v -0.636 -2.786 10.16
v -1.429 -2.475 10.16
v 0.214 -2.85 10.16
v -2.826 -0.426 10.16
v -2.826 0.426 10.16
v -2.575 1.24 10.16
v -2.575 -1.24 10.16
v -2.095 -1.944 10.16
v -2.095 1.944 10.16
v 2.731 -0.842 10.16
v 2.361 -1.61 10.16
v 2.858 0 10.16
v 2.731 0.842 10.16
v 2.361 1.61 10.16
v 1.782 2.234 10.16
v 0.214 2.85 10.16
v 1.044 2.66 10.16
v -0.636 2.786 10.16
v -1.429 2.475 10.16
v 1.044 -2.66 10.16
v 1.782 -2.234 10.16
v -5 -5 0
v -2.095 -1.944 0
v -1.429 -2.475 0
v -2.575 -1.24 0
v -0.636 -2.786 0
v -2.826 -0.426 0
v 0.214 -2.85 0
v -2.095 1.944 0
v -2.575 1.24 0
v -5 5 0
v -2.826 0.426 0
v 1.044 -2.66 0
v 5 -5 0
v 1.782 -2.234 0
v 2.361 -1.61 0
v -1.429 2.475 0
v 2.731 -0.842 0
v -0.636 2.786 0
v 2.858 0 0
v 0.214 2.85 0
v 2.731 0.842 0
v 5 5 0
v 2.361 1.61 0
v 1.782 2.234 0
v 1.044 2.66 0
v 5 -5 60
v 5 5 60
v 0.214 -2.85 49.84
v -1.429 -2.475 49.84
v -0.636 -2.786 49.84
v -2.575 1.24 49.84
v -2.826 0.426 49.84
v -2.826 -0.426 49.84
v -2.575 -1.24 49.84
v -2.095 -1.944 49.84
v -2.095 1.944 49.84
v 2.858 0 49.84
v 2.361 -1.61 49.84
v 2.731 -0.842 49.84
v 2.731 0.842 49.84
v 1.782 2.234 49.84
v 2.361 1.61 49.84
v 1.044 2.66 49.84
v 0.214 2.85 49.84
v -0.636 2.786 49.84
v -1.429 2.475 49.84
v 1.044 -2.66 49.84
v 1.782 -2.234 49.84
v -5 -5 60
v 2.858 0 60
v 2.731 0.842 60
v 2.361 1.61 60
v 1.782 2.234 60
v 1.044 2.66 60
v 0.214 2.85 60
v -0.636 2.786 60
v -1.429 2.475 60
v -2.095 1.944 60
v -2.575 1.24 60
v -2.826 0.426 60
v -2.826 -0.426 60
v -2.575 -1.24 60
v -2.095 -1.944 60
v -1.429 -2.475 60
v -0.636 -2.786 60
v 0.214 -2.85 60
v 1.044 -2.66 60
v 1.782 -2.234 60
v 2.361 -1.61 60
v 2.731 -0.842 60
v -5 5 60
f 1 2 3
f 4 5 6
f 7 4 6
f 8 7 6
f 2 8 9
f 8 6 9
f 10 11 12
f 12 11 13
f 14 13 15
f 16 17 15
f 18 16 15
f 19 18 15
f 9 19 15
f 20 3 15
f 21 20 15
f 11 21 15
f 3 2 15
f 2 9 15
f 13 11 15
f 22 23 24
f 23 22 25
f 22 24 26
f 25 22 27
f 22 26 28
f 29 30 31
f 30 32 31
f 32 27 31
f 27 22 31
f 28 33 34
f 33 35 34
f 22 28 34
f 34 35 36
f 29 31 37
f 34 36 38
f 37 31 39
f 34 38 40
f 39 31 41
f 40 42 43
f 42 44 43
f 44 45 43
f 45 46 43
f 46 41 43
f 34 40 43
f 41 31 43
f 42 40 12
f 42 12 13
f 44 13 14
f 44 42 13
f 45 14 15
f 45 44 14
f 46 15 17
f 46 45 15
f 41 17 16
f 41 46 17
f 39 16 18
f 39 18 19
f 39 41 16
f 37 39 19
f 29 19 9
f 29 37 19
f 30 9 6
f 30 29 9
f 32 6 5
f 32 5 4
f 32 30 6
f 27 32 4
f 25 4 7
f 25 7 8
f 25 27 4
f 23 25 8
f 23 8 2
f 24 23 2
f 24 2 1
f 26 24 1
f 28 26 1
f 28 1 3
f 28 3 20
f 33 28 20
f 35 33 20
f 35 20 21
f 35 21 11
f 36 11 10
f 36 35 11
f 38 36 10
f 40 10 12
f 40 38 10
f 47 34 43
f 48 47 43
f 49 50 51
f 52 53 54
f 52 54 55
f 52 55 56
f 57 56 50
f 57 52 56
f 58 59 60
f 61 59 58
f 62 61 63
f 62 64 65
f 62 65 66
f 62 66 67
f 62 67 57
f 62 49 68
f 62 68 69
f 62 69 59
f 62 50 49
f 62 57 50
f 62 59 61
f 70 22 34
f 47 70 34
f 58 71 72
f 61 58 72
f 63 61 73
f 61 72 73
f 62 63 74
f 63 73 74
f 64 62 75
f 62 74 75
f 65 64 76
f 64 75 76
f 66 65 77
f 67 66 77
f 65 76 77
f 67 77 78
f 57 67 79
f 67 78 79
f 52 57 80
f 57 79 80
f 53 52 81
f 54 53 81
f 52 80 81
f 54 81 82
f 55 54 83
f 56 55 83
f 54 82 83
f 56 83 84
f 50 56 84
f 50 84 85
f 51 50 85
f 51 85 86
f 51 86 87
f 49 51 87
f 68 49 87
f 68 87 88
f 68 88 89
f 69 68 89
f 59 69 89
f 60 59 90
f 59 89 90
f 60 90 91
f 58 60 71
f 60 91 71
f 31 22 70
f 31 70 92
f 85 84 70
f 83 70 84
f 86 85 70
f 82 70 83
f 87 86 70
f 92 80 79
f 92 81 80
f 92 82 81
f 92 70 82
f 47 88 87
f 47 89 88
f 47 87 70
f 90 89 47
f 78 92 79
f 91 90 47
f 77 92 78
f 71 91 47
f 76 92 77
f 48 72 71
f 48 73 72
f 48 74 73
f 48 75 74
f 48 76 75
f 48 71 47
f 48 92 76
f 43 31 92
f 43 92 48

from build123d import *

# Parameters (mm, degrees)
F0_W     = 10
F0_H     = 10
F1_DEPTH = 60
F2_R     = 2.8575
F3_DEPTH = 10.16
F4_R     = 2.8575
F5_DEPTH = 10.16


with BuildPart() as f1:
    # F0 (on Top) → F1 (new body)
    with BuildSketch(Plane.XY):
        Rectangle(F0_W, F0_H)
    extrude(amount=F1_DEPTH)

    # F2 (on Top) → F3 (cut)
    with BuildSketch(Plane.XY):
        Circle(F2_R)
    extrude(amount=F3_DEPTH, mode=Mode.SUBTRACT)

    # F4 (on face) → F5 (cut)
    with BuildSketch(Plane.XY.offset(60)):
        Circle(F4_R)
    extrude(amount=-F5_DEPTH, mode=Mode.SUBTRACT)


solid = f1.part
